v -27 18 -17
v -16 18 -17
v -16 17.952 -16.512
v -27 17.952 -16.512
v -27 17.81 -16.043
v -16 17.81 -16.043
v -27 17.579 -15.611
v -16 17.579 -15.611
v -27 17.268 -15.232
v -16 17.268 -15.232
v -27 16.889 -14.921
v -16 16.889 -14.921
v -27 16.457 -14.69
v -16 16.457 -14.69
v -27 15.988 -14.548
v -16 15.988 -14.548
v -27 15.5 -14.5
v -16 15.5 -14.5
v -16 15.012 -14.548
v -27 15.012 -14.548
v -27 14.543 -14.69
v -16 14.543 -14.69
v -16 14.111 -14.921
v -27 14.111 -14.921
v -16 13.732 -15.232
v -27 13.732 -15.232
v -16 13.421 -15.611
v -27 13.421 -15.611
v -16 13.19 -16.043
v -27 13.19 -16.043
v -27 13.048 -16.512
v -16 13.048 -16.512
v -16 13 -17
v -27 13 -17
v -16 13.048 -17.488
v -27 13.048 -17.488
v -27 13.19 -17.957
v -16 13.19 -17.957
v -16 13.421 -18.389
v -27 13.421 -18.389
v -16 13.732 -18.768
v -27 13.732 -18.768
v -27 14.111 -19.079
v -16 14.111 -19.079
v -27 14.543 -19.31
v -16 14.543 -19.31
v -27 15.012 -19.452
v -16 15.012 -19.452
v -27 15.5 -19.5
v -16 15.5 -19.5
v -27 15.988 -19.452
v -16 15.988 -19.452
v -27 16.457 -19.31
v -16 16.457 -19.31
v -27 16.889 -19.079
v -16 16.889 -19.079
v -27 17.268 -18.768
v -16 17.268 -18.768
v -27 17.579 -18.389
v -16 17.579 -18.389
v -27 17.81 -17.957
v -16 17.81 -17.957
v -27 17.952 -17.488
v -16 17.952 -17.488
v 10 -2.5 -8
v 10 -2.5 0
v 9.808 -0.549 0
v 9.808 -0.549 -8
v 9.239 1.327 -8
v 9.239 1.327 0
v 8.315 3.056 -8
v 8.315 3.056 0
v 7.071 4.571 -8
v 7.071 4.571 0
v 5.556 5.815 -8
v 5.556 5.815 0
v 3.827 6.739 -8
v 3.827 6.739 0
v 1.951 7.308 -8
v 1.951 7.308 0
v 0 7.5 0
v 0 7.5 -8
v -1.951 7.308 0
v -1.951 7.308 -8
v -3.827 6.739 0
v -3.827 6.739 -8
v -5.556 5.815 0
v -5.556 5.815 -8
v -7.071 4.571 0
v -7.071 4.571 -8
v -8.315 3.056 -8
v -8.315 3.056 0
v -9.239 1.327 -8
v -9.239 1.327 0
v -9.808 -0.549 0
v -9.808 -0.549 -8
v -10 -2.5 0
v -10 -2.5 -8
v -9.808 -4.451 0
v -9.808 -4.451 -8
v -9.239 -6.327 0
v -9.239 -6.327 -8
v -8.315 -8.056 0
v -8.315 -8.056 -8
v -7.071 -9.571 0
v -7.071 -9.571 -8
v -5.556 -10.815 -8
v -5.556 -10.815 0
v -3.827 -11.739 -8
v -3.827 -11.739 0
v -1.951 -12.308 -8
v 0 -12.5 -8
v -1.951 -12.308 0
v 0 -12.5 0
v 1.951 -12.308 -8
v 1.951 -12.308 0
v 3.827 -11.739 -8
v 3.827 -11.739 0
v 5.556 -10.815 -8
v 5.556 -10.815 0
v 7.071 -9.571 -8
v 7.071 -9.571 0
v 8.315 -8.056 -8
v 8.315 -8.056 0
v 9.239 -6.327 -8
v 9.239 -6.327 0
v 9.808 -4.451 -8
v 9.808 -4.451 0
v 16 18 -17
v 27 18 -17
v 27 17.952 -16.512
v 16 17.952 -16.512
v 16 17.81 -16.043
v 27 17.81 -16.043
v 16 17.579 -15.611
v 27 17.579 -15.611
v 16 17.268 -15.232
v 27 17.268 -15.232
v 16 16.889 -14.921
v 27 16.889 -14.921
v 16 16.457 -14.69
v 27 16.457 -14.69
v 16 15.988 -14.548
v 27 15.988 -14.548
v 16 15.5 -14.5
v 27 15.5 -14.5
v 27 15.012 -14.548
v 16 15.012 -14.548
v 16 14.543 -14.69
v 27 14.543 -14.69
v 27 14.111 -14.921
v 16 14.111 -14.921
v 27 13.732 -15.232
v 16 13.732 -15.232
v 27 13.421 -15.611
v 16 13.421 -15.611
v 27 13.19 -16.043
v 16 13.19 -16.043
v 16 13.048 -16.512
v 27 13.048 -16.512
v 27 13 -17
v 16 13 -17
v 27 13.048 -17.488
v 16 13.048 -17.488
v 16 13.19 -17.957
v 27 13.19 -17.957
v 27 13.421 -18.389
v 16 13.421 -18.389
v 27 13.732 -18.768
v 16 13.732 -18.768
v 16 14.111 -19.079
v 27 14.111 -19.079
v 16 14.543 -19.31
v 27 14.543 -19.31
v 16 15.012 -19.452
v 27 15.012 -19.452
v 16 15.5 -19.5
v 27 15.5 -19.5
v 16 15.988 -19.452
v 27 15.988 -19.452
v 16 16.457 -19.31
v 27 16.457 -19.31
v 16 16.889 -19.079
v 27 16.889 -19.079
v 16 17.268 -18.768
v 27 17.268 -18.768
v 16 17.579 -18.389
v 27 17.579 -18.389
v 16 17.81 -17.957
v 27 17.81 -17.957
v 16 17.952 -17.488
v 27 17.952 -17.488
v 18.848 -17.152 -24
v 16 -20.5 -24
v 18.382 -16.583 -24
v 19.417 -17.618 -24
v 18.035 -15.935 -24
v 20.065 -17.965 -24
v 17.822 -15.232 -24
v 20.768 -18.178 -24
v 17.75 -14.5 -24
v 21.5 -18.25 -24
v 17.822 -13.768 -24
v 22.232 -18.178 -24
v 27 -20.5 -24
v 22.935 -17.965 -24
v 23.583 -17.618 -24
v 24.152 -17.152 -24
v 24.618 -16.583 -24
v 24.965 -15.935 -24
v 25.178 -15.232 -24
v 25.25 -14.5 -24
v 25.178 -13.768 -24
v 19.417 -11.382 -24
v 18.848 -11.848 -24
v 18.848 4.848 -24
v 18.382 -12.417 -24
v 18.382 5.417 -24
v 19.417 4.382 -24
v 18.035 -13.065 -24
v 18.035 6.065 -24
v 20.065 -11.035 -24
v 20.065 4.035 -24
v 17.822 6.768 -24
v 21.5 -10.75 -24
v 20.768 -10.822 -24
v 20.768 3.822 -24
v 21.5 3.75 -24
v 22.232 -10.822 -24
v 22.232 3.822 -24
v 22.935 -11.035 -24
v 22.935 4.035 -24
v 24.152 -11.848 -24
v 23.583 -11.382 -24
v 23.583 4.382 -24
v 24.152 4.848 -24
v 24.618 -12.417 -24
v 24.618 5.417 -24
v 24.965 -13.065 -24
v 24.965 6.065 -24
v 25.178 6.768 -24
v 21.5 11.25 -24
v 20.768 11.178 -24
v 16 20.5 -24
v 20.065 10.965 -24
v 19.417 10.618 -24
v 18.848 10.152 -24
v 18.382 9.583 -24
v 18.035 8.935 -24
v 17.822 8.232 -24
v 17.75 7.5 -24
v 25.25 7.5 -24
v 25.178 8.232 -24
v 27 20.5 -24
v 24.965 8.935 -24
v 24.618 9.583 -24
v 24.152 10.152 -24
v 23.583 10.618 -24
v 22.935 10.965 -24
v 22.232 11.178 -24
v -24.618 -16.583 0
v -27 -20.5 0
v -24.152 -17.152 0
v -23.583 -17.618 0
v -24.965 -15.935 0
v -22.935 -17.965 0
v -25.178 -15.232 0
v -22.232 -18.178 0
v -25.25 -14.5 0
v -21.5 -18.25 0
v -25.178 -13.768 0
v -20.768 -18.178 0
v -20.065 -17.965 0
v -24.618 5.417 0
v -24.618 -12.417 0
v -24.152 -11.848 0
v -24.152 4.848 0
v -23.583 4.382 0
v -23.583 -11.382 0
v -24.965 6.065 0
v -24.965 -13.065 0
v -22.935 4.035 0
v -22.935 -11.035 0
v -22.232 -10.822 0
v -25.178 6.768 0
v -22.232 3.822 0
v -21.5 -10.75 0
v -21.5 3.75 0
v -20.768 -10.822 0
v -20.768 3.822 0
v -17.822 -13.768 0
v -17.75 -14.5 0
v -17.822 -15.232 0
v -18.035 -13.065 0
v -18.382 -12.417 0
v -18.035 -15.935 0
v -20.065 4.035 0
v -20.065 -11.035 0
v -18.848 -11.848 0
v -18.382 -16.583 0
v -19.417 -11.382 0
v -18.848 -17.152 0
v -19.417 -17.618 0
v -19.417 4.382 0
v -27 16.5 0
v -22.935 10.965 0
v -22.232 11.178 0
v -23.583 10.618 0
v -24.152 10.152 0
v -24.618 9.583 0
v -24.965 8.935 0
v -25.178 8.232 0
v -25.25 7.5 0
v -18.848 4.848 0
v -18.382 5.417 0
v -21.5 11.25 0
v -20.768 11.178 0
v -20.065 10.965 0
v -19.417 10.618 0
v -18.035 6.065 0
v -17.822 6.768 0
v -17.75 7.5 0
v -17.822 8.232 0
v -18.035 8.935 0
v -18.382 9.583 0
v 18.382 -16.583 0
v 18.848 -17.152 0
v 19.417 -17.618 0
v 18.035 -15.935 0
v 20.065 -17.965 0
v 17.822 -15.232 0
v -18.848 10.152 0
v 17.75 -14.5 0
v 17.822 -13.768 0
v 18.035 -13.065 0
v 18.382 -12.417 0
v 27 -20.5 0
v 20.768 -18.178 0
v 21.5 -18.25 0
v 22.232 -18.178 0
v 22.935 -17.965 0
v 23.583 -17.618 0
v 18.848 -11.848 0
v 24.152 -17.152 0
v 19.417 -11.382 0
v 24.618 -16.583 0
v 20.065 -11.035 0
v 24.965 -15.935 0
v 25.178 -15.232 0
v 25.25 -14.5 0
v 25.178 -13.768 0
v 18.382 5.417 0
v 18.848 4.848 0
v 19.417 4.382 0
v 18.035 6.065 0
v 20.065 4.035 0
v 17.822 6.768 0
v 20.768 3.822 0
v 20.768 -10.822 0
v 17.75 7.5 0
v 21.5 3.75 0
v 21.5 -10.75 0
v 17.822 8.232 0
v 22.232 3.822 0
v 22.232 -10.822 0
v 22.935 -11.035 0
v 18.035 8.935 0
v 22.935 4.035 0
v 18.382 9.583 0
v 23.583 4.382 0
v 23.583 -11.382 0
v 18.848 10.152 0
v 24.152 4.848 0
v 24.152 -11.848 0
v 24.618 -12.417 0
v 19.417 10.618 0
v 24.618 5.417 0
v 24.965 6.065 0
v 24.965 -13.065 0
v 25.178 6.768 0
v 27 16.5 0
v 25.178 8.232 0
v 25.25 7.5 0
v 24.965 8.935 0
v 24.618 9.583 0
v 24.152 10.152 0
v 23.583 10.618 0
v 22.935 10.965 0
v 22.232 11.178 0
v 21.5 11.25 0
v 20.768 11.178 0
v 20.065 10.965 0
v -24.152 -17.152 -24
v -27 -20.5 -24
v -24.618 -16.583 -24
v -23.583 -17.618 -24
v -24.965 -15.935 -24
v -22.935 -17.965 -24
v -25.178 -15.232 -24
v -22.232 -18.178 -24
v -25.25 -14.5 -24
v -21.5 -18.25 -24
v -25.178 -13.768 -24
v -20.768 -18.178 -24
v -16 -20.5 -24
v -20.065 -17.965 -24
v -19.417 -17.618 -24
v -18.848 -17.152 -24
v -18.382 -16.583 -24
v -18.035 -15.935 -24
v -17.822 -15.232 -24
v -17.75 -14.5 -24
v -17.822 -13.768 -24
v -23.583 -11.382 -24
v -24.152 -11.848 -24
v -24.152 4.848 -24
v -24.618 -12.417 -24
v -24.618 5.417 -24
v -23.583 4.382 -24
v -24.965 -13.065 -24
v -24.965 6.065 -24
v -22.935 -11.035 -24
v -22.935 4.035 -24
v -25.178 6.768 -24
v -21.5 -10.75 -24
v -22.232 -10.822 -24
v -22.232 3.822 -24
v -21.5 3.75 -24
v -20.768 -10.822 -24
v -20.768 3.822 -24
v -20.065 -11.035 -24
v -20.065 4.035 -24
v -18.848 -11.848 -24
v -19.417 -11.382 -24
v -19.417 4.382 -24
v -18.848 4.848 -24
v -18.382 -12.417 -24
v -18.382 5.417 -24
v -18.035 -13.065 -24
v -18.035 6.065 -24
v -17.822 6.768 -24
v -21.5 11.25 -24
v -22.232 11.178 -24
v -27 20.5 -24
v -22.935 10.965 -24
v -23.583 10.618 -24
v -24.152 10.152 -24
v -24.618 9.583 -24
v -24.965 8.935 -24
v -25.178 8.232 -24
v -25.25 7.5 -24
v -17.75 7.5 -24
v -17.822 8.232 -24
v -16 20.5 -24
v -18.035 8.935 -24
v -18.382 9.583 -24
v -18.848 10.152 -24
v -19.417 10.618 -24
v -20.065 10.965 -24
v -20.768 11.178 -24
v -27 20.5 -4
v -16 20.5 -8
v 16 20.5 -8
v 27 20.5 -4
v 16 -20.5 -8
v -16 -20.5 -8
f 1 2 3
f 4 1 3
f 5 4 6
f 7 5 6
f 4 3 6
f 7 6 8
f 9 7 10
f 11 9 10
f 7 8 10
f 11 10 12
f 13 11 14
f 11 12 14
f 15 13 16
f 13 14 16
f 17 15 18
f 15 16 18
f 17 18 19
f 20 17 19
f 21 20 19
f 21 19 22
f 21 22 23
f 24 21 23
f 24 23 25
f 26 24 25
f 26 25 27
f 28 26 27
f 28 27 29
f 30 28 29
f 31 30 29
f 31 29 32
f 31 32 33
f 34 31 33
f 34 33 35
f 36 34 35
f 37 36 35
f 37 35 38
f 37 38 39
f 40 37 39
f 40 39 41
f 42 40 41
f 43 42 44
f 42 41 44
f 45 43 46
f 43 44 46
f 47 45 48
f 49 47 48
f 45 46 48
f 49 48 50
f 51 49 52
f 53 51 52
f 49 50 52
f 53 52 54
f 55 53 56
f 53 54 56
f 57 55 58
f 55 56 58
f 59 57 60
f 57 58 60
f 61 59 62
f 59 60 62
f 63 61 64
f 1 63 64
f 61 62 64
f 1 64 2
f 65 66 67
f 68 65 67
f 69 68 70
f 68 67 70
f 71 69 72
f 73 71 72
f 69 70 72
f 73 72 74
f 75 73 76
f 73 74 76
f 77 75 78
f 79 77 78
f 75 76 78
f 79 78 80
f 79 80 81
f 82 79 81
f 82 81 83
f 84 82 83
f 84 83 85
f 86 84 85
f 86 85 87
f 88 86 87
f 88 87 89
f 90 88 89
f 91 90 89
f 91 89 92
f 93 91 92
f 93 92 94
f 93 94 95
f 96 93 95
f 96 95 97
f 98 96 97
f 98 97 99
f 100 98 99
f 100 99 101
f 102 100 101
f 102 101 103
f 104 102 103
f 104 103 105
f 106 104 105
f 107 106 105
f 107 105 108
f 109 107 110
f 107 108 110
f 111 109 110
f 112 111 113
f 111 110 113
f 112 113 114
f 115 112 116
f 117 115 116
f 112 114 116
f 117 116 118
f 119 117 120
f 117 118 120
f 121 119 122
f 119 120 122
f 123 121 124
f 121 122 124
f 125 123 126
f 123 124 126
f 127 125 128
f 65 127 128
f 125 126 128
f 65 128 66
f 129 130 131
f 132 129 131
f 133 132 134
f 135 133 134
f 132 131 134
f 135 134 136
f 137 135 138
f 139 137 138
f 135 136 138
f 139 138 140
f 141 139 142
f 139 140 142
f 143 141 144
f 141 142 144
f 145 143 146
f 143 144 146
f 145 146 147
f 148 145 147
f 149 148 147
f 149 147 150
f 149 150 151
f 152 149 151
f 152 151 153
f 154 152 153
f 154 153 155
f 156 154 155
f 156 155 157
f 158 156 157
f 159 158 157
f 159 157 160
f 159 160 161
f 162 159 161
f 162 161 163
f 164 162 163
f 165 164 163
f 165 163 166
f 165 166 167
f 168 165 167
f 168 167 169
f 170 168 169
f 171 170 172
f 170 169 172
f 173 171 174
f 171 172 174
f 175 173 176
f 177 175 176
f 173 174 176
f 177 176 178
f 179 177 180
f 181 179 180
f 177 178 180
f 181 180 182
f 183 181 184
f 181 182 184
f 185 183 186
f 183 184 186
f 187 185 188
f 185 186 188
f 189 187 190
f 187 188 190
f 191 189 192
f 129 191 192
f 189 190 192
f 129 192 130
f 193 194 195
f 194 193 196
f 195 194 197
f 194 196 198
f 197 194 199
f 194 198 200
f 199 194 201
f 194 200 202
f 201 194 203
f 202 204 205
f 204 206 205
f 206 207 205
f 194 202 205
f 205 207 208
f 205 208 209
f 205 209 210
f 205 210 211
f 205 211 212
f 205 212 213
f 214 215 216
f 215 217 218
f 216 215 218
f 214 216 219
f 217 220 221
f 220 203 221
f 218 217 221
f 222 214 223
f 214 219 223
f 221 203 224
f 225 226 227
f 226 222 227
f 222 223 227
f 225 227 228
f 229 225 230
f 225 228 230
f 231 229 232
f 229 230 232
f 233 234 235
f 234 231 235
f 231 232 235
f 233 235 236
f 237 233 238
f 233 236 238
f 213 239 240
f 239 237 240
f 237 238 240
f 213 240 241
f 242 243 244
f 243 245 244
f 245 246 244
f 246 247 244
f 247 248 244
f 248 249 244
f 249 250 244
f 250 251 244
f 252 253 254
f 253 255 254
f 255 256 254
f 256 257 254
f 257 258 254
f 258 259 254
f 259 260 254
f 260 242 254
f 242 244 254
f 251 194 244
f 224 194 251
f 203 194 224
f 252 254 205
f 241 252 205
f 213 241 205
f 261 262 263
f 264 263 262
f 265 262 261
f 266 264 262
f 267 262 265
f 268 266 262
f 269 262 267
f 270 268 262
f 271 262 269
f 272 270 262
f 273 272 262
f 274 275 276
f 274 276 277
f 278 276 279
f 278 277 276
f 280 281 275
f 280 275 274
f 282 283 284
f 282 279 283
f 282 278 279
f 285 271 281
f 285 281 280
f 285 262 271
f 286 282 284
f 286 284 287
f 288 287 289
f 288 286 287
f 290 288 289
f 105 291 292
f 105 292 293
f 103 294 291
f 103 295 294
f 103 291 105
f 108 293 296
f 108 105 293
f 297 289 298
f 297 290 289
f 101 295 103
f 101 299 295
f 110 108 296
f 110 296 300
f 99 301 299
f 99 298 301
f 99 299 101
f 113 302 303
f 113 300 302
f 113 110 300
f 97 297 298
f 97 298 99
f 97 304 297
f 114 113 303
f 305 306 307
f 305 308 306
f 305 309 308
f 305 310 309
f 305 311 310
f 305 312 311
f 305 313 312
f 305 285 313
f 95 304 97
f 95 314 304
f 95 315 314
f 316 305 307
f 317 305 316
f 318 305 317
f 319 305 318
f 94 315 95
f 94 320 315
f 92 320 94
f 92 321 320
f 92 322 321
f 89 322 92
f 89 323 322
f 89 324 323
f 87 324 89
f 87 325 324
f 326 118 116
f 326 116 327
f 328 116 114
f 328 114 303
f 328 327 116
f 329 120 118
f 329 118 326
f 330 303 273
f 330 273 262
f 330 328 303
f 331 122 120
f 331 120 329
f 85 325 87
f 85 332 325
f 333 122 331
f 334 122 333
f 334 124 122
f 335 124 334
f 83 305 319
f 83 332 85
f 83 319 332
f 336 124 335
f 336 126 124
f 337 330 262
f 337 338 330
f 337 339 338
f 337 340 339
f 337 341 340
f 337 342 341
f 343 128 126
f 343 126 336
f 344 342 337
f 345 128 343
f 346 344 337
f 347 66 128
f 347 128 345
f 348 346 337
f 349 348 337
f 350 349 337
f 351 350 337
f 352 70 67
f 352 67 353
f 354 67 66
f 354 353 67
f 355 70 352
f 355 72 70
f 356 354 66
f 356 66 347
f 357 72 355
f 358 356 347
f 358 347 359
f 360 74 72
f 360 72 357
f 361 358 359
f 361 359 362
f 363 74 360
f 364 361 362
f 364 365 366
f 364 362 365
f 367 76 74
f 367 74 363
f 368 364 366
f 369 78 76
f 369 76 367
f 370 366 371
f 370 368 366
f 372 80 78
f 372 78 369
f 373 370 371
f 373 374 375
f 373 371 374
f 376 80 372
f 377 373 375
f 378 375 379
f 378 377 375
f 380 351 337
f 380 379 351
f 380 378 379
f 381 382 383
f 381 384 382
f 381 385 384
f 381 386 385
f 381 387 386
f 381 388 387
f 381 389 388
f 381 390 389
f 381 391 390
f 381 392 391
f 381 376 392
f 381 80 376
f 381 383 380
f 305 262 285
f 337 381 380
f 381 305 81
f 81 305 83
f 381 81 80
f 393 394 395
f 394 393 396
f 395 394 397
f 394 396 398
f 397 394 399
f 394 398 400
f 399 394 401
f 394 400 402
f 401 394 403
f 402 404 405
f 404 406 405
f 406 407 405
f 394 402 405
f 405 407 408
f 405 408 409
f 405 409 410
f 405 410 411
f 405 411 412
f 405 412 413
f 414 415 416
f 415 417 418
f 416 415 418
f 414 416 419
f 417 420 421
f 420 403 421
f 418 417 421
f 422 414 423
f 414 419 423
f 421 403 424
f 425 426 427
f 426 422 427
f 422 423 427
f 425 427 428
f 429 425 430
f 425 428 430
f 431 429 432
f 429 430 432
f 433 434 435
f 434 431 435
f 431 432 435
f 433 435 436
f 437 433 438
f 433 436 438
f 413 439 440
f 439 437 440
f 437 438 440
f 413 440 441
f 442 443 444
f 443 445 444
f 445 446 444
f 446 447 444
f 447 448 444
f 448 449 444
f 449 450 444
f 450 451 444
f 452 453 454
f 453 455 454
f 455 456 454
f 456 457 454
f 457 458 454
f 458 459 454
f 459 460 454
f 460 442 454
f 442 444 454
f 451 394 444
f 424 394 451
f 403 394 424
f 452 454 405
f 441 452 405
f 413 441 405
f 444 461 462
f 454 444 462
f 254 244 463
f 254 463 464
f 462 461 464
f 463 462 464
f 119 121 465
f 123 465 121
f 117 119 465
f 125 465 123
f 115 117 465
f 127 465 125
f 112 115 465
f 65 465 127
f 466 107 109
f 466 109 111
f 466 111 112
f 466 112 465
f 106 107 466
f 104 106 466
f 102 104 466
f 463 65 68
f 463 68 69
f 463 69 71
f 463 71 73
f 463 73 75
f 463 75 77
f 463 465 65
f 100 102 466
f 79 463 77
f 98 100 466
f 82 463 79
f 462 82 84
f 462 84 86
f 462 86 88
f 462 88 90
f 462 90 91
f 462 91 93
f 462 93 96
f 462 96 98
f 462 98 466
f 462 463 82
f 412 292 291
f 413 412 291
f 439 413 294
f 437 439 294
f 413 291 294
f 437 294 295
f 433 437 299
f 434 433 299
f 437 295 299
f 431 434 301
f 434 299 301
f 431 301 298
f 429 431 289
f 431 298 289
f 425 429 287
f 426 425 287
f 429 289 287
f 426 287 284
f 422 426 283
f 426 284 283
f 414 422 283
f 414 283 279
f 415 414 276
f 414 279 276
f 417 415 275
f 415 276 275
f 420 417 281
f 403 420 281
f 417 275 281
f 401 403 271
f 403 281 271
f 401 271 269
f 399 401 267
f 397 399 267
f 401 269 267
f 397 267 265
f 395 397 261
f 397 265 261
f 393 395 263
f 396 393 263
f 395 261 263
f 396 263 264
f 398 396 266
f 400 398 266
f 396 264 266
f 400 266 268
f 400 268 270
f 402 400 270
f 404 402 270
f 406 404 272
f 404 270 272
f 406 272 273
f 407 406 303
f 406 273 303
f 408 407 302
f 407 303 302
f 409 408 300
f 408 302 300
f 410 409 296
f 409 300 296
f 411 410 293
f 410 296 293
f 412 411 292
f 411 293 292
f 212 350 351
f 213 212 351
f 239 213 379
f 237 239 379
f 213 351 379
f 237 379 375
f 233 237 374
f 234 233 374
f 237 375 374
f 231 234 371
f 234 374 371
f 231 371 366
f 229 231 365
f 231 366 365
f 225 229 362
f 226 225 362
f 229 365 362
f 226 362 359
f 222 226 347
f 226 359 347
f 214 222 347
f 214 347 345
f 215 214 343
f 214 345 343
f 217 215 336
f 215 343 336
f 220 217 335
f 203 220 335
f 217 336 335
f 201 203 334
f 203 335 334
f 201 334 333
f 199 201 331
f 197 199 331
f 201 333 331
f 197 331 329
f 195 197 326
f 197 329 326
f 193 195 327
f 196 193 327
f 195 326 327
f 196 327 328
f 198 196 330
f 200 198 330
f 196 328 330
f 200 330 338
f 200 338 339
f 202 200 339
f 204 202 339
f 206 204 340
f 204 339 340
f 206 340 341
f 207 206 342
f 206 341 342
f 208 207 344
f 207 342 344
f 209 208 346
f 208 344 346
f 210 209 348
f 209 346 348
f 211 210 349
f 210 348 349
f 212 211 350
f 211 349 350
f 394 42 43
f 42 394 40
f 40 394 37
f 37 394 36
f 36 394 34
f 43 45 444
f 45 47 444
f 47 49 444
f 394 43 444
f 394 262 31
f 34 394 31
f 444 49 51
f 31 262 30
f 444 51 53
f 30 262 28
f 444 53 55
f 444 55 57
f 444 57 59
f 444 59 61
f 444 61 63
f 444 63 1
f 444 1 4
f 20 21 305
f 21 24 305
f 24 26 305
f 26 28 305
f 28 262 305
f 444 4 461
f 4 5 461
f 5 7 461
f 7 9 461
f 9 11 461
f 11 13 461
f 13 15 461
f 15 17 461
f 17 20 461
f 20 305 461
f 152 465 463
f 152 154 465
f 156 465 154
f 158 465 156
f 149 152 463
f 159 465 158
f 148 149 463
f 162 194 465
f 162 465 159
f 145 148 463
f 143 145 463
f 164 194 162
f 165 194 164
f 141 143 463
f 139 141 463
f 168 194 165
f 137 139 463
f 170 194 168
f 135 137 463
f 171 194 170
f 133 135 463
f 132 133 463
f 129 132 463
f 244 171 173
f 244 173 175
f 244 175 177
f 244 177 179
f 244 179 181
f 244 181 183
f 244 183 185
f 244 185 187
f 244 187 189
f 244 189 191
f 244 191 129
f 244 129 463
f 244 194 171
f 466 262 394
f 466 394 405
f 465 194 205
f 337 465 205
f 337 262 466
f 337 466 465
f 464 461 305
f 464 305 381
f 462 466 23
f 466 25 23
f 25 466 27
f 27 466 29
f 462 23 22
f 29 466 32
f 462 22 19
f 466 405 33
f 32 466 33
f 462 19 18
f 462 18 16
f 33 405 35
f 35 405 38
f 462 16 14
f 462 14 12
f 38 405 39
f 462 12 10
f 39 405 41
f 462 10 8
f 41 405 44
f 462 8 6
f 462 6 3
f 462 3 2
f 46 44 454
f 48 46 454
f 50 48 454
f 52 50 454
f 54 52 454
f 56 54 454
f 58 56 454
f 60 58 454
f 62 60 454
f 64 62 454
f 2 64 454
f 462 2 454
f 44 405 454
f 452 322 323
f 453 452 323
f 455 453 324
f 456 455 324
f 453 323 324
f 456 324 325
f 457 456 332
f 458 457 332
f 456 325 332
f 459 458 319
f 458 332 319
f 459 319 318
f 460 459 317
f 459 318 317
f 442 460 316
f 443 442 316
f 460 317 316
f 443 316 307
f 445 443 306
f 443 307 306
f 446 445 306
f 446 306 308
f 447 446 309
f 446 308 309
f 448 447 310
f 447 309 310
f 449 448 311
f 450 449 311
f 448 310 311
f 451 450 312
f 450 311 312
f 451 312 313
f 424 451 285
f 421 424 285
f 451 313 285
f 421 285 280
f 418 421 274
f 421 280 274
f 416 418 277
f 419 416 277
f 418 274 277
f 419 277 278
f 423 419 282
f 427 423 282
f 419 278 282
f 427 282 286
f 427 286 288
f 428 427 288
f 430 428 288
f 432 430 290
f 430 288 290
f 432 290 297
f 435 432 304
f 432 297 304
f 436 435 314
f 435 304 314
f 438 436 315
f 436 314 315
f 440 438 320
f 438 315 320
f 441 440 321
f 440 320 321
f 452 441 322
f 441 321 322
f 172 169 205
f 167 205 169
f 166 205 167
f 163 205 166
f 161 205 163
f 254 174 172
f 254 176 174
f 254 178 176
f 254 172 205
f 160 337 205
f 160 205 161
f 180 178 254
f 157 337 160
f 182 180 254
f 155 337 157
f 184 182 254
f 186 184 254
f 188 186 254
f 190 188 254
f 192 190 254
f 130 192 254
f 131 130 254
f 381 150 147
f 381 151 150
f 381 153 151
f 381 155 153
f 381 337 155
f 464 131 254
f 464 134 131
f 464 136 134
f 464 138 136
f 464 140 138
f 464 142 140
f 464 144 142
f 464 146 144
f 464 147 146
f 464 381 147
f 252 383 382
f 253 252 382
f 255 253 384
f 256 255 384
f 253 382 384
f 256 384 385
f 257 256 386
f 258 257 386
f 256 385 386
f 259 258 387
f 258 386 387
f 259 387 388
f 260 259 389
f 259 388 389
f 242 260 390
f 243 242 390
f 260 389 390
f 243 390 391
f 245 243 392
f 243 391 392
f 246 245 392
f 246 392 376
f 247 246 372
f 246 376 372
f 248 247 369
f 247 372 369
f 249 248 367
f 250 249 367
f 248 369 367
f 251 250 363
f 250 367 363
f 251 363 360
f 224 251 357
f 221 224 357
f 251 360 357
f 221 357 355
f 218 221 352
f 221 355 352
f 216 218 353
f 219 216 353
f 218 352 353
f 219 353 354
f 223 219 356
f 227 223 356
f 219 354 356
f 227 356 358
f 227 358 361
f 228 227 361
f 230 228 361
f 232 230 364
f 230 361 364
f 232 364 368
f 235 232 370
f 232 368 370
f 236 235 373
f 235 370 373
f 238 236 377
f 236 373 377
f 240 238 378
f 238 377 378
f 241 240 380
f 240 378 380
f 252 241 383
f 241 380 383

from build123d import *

# Parameters (mm, degrees)
CROQUIS1_W              = 54
CROQUIS1_H              = 41
CROQUIS1_R              = 3.75
SALIENTE_EXTRUIR1_DEPTH = 24
CROQUIS2_W              = 32
CROQUIS2_H              = 41
CORTAR_EXTRUIR1_DEPTH   = 16
CROQUIS3_R              = 2.5
CORTAR_EXTRUIR2_DEPTH   = 63.547981582
CHAFL_N1_SIZE           = 4
CORTAR_EXTRUIR3_REACH   = 43.536
CROQUIS4_R              = 10


with BuildPart() as part:
    # Croquis1 → Saliente-Extruir1 (new body)
    with BuildSketch(Plane.XY):
        Rectangle(CROQUIS1_W, CROQUIS1_H)
        with Locations((-21.5, 7.5)):
            Circle(CROQUIS1_R, mode=Mode.SUBTRACT)
        with Locations((21.5, 7.5)):
            Circle(CROQUIS1_R, mode=Mode.SUBTRACT)
        with Locations((21.5, -14.5)):
            Circle(CROQUIS1_R, mode=Mode.SUBTRACT)
        with Locations((-21.5, -14.5)):
            Circle(CROQUIS1_R, mode=Mode.SUBTRACT)
    extrude(amount=-SALIENTE_EXTRUIR1_DEPTH)

    # Croquis2 → Cortar-Extruir1 (cut)
    with BuildSketch(Plane(origin=(0, 0, -24), x_dir=(-1, 0, 0), z_dir=(0, 0, -1))):
        Rectangle(CROQUIS2_W, CROQUIS2_H)
    extrude(amount=-CORTAR_EXTRUIR1_DEPTH, mode=Mode.SUBTRACT)

    # Croquis3 → Cortar-Extruir2 (cut, through all)
    with BuildSketch(Plane(origin=(27, 0, 0), x_dir=(0, 0, -1), z_dir=(1, 0, 0))):
        with Locations(Location((17, 15.5, 0), (0, 0, 90))):
            Circle(CROQUIS3_R)
    extrude(amount=-CORTAR_EXTRUIR2_DEPTH, mode=Mode.SUBTRACT)

    # Chaflán1
    chafl_n1_edges = [part.edges().sort_by_distance(p)[0] for p in [
        (0, 20.5, 0),
    ]]
    chamfer(chafl_n1_edges, length=CHAFL_N1_SIZE)

    # Croquis4 → Cortar-Extruir3 (cut, up to next)
    with BuildSketch(Plane.XY, mode=Mode.PRIVATE) as cortar_extruir3_sk1:
        with Locations((0, -2.5)):
            Circle(CROQUIS4_R)
    cortar_extruir3_tool1 = extrude(cortar_extruir3_sk1.sketch, amount=-CORTAR_EXTRUIR3_REACH, mode=Mode.PRIVATE) & part.part
    add(cortar_extruir3_tool1.solids().sort_by_distance((0, -2.5, 0))[0], mode=Mode.SUBTRACT)


solid = part.part
